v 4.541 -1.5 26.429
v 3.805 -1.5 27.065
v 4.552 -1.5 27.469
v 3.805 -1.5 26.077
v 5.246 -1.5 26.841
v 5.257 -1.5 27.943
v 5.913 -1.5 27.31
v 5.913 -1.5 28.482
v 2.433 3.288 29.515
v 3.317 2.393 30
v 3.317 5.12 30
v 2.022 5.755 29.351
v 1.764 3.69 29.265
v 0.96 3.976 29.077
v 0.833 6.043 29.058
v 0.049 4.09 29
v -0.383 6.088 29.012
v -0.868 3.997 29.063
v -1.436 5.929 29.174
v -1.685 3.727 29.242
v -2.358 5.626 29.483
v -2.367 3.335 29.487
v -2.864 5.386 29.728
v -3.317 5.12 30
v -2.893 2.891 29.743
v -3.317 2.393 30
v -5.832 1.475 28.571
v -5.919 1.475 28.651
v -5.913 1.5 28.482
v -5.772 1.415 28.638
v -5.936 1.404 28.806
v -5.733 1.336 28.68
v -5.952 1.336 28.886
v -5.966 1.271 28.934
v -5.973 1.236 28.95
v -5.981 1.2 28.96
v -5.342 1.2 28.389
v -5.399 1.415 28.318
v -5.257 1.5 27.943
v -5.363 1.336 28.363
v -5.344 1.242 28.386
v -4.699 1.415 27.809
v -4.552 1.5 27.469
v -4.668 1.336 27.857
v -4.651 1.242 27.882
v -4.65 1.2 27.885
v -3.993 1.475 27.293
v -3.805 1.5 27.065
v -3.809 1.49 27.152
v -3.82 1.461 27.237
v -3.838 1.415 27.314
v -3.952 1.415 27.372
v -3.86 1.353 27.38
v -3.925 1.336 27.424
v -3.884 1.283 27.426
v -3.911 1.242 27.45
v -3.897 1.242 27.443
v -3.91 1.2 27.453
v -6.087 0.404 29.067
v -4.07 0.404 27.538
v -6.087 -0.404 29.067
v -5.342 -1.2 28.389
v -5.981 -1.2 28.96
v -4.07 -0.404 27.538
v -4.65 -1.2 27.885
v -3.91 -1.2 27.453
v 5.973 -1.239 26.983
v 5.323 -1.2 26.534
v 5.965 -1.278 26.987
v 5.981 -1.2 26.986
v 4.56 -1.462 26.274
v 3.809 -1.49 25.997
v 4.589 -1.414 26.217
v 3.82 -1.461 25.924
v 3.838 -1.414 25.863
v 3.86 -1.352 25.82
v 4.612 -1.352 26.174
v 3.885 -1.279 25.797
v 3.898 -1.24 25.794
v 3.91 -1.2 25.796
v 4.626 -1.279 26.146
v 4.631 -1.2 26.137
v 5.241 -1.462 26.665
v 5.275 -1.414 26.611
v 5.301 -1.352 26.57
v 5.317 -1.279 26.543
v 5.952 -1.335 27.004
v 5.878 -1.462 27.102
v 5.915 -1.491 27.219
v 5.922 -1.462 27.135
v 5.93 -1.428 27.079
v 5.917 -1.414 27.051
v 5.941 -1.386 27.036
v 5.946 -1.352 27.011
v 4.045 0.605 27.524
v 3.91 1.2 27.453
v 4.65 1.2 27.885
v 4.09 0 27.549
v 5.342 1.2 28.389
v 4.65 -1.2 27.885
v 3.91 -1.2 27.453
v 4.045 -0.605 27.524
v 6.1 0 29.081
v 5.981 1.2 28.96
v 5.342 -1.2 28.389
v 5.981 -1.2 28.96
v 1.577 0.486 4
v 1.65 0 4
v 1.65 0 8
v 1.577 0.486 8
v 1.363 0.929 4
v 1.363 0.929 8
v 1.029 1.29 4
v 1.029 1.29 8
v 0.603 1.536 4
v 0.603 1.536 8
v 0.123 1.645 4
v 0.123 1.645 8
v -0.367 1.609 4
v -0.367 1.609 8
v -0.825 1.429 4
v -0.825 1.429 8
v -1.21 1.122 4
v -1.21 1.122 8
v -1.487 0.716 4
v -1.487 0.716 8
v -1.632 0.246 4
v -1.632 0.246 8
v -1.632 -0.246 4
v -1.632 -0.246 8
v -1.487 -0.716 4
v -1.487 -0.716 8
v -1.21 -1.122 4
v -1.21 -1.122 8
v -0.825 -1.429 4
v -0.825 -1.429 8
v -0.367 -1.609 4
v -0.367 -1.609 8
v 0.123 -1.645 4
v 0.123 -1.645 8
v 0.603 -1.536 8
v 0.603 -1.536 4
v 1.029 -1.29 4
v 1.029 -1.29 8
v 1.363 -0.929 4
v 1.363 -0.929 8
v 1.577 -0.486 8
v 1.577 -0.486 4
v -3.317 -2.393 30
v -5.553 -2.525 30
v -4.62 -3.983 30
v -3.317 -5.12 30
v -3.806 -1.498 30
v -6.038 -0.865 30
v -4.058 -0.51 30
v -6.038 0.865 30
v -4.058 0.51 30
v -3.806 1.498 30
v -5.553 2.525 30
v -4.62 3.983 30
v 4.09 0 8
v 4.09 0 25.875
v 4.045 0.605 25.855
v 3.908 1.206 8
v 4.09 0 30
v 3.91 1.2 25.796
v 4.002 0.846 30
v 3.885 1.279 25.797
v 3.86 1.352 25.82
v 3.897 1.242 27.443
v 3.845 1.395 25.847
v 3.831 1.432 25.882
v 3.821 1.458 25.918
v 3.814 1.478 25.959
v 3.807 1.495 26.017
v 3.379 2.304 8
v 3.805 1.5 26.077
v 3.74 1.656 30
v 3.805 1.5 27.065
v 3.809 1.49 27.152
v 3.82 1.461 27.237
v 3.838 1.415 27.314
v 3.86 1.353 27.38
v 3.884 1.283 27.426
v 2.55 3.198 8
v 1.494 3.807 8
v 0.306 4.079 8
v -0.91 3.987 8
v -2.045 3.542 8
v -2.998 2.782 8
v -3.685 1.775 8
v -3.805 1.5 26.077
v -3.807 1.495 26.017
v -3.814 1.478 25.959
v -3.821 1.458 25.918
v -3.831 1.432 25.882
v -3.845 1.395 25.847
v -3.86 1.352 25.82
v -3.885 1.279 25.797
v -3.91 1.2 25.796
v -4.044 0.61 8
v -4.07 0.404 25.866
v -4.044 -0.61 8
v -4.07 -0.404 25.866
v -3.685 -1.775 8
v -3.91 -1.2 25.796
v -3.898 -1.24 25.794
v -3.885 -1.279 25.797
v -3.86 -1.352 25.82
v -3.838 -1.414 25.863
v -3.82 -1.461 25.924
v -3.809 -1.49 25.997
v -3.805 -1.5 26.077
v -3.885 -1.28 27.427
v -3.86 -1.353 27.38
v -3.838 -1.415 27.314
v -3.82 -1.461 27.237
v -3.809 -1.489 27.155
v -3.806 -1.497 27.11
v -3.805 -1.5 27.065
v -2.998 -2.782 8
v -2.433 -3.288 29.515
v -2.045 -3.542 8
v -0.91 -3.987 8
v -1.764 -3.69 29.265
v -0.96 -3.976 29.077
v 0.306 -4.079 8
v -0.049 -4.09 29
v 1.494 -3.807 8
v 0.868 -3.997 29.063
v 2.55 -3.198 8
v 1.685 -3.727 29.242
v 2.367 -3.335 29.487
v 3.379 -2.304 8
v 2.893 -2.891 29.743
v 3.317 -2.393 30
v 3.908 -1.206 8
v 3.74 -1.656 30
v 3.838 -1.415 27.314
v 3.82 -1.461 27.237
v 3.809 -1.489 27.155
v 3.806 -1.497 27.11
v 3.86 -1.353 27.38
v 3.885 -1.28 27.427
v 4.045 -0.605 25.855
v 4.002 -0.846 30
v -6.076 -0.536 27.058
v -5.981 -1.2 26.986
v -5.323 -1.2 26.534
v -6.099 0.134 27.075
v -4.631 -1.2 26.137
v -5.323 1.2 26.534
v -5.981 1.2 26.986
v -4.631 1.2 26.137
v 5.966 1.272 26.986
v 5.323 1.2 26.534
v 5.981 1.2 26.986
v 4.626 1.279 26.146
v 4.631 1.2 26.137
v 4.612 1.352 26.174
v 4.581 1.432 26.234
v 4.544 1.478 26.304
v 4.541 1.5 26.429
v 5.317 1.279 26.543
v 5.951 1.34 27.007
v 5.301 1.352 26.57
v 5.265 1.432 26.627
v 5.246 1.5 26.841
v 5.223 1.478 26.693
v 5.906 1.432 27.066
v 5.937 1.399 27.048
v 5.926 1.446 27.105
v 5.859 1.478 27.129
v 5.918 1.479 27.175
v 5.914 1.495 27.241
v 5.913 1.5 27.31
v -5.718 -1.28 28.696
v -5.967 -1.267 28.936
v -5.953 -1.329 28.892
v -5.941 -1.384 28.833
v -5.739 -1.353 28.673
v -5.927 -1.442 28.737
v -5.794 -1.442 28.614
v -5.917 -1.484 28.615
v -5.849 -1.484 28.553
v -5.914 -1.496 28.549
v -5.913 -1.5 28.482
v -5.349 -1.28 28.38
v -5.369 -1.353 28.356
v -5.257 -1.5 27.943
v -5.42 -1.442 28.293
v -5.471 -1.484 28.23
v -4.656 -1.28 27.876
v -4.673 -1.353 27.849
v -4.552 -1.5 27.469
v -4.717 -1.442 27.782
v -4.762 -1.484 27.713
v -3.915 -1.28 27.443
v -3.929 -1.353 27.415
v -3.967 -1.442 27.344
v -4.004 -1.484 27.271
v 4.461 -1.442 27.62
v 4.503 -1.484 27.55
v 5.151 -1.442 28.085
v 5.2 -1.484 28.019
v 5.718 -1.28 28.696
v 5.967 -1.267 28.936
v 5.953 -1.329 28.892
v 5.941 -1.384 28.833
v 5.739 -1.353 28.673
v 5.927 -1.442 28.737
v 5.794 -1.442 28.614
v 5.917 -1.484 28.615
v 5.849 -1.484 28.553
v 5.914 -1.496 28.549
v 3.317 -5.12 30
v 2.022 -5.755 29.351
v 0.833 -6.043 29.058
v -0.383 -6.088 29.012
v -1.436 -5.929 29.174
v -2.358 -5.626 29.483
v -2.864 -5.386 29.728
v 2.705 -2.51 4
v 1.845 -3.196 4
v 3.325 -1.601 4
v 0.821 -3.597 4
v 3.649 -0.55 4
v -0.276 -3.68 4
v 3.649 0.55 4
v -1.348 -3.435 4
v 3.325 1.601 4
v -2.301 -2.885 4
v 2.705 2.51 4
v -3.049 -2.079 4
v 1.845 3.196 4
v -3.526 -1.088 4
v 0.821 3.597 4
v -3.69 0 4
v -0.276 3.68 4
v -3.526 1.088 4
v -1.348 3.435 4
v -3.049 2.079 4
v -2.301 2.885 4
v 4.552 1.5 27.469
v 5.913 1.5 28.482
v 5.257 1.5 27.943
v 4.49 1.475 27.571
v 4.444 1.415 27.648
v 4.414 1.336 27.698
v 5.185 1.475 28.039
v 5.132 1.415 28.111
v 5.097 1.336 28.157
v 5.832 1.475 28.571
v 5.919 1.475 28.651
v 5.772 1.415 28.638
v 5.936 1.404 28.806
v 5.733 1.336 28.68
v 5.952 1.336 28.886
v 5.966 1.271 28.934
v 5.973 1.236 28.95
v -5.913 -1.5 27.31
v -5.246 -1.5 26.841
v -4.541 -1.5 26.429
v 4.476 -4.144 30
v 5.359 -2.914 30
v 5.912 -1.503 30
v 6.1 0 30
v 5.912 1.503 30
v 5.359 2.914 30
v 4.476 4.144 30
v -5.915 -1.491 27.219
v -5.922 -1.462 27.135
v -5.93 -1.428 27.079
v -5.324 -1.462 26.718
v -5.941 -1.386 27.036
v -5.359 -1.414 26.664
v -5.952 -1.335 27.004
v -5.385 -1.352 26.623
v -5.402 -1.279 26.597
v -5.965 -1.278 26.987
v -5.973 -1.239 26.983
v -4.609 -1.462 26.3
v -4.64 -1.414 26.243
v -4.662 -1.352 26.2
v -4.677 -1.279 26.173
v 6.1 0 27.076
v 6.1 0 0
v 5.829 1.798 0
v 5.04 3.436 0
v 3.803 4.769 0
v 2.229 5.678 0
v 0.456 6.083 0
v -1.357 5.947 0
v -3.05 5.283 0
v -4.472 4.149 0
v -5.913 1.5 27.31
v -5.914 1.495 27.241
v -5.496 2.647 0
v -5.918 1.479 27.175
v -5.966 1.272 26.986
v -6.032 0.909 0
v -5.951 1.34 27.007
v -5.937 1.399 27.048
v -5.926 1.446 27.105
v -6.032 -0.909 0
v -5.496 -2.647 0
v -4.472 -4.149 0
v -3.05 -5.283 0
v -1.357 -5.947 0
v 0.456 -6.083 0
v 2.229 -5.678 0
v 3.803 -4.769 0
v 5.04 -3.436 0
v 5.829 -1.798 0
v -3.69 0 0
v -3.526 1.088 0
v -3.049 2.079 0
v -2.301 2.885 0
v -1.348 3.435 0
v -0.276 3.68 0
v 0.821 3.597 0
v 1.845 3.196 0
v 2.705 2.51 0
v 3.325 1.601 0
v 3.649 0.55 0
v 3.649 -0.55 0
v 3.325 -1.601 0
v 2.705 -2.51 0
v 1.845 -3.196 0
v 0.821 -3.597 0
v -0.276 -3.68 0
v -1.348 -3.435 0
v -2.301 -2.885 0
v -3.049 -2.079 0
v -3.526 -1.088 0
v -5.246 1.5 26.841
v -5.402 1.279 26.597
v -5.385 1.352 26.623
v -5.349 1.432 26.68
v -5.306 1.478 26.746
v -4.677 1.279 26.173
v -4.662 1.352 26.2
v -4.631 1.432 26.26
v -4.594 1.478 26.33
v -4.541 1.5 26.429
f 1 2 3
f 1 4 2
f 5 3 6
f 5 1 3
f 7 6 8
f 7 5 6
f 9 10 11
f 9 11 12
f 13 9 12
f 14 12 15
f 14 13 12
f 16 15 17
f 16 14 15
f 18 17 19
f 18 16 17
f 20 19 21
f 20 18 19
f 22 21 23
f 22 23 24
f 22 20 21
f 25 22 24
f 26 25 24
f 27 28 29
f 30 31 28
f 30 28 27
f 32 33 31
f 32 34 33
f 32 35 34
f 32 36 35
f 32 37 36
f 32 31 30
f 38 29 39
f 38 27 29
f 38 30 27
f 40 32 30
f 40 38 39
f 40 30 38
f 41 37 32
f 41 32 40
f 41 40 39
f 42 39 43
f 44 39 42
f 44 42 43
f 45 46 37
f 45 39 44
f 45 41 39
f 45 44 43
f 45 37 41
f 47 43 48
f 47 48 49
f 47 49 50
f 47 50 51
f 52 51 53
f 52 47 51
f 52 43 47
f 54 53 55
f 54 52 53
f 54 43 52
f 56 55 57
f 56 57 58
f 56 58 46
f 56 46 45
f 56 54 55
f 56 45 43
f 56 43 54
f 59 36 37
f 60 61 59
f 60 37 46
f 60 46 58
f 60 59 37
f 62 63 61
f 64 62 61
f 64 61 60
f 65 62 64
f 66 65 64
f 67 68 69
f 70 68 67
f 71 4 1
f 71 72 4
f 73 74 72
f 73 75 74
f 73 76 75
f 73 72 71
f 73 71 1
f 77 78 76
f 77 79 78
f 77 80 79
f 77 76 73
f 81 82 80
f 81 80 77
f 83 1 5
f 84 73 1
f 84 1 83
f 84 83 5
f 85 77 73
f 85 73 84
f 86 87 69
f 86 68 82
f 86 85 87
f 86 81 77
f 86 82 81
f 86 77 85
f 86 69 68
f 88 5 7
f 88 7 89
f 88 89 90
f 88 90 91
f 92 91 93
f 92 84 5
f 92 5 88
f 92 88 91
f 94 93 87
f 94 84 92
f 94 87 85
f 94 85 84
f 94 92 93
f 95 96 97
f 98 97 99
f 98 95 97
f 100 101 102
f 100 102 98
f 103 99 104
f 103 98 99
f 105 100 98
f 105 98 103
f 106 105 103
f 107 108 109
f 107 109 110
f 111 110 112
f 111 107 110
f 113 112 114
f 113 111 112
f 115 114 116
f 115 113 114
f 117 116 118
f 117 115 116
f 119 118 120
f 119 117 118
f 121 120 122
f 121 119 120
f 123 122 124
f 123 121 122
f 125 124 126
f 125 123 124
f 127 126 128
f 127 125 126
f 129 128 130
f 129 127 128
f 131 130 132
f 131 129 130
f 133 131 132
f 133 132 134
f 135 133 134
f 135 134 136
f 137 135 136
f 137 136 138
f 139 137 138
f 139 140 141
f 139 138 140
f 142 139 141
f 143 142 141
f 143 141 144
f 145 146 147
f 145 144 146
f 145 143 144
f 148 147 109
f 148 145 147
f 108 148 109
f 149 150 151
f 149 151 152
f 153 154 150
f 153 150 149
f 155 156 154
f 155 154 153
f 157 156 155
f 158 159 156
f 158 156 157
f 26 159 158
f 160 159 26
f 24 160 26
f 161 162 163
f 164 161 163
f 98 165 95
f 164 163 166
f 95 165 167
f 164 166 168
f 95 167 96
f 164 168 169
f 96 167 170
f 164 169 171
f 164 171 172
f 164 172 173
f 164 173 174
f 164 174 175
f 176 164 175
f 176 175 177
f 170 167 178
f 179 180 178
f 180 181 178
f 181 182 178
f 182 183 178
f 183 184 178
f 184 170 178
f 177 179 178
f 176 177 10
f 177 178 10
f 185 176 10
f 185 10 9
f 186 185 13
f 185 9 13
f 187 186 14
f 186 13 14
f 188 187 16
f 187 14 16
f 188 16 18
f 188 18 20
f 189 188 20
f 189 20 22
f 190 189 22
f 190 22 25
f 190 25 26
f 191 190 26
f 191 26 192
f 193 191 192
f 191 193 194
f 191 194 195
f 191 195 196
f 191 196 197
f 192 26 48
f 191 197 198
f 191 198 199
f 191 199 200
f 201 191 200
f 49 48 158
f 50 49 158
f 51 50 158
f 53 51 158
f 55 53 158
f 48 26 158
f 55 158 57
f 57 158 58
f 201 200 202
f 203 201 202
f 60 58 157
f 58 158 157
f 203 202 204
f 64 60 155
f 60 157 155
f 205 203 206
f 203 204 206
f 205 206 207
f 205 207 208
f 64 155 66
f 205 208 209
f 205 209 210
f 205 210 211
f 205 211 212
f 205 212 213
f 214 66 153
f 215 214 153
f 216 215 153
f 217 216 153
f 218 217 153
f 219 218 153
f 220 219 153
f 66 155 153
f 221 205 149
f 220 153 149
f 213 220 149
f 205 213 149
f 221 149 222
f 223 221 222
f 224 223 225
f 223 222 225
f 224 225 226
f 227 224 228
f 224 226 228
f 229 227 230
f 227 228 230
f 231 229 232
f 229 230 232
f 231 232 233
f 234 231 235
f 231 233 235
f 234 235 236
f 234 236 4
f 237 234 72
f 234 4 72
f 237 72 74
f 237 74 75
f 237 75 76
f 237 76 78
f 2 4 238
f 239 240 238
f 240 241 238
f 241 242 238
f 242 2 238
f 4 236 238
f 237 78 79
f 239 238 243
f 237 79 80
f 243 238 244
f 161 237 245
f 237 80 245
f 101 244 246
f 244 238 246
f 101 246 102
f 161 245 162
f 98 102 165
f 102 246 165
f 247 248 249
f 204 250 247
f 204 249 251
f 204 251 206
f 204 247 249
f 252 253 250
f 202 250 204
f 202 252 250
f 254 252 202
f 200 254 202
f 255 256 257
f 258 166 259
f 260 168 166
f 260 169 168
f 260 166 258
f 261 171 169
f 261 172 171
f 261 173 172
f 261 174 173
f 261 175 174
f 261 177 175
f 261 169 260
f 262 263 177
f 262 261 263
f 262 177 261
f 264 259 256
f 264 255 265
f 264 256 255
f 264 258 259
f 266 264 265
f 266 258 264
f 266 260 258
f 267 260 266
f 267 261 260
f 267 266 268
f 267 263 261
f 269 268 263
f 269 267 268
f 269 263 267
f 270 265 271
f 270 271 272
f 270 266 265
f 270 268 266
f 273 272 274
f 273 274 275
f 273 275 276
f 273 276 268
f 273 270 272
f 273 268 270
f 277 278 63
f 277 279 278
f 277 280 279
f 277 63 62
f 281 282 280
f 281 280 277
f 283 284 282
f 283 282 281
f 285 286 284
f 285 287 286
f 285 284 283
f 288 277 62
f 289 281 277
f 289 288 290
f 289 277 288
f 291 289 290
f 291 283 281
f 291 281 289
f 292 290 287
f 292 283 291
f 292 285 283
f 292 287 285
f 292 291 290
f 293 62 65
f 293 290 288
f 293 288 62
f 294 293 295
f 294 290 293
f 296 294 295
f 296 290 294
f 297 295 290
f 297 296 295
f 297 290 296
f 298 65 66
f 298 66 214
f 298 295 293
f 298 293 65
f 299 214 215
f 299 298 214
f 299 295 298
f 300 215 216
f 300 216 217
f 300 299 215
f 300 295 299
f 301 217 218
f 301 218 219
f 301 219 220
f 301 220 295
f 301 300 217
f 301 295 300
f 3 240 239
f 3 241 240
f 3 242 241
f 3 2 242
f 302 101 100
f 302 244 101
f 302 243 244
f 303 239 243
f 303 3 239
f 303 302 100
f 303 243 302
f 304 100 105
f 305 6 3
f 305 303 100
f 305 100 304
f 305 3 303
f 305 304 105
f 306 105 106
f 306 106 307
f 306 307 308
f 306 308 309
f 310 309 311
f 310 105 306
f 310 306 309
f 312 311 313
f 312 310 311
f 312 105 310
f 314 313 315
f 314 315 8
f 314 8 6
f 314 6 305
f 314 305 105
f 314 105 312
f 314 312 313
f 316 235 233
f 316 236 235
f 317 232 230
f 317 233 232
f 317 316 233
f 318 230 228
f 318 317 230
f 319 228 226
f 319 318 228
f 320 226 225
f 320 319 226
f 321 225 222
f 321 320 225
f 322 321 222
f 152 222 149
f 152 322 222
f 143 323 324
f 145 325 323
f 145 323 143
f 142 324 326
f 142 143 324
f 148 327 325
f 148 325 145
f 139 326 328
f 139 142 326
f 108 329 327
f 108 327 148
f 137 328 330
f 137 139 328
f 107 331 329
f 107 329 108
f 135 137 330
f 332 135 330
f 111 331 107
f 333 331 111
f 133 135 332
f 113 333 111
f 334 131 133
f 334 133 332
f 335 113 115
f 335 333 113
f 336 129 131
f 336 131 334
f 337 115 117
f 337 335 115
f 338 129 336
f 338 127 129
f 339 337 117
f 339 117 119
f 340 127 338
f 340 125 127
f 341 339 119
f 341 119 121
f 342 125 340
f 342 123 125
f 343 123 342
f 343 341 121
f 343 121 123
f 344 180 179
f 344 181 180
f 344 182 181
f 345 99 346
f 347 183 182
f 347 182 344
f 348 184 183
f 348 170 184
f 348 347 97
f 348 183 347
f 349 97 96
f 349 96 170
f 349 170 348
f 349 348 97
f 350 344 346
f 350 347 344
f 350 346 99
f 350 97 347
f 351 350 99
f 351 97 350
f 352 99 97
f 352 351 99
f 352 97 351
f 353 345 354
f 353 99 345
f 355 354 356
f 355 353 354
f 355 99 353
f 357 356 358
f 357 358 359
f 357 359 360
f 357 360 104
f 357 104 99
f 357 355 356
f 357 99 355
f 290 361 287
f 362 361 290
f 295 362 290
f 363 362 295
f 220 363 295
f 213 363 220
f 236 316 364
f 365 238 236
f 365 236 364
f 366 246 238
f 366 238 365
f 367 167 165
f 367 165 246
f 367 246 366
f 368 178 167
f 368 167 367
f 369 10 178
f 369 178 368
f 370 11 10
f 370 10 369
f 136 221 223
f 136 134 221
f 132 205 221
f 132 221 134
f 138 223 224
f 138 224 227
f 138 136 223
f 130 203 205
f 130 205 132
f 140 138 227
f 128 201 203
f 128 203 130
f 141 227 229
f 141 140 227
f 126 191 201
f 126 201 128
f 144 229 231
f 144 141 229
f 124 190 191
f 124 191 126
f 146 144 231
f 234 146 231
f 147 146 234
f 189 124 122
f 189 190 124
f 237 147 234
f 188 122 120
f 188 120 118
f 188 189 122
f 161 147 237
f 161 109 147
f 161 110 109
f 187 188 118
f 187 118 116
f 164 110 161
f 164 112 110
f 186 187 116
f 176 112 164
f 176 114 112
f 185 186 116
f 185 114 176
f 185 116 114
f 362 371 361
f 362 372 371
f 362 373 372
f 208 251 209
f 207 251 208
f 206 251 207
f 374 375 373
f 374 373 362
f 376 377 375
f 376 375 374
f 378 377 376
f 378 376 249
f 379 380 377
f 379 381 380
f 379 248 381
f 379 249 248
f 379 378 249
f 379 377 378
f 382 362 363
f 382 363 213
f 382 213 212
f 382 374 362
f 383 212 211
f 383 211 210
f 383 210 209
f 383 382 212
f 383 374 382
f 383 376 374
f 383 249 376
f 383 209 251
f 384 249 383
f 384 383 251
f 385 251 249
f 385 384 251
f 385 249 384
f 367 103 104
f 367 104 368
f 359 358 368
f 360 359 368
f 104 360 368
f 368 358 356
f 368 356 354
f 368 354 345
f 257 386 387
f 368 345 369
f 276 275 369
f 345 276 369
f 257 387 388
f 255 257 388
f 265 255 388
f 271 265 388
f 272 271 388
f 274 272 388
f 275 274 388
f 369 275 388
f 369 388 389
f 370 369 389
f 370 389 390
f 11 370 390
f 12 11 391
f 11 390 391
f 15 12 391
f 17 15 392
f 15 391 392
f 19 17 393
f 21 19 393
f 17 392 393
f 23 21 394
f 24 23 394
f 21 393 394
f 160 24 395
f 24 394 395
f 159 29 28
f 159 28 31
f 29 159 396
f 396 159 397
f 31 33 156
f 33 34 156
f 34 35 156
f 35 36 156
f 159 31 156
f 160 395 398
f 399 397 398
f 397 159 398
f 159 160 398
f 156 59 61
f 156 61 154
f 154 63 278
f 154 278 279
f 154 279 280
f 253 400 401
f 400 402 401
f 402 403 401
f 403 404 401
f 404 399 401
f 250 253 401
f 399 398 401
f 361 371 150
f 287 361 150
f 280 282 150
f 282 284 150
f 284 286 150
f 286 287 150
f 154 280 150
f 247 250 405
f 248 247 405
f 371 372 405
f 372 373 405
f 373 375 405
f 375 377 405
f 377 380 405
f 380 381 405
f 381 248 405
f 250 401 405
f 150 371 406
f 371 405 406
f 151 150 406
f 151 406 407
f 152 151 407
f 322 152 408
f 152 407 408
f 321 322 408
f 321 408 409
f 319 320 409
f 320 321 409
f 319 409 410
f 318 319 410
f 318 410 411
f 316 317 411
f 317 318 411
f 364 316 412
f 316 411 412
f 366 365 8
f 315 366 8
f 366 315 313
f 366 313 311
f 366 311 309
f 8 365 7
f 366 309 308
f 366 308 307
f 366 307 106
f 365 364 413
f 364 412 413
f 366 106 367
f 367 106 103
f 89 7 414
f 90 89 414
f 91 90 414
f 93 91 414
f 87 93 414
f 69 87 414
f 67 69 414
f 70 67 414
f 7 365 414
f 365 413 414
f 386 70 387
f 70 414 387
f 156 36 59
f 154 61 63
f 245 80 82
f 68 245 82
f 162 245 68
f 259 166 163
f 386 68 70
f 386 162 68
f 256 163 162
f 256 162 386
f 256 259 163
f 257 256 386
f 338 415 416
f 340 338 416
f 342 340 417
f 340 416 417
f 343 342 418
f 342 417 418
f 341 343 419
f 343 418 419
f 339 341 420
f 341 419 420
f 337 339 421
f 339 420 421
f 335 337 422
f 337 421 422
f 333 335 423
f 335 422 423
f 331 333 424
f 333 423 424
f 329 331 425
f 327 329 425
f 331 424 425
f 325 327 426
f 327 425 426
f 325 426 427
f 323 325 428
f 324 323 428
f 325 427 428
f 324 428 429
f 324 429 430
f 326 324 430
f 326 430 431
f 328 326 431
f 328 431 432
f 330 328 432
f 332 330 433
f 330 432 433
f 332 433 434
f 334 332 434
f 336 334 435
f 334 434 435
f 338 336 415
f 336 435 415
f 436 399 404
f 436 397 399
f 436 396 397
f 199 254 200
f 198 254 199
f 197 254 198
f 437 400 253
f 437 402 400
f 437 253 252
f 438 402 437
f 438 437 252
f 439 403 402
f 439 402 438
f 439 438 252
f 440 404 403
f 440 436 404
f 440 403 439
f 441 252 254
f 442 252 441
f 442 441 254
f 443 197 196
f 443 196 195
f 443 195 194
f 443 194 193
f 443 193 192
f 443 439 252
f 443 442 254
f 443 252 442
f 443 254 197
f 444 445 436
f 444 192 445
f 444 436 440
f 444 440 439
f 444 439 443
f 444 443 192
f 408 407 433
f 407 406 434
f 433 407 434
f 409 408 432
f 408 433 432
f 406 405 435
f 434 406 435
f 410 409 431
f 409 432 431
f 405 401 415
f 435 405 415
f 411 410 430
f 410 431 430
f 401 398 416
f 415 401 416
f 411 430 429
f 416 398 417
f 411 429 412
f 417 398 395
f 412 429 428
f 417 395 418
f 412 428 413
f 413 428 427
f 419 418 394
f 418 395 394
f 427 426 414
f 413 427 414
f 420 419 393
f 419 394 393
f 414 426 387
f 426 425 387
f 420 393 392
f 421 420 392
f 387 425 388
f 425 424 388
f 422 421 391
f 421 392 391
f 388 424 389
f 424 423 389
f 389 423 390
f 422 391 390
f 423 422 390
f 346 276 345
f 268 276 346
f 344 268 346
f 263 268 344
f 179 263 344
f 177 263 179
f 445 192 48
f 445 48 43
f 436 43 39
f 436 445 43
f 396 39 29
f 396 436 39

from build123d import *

# Parameters (mm, degrees)
SKETCH1_R               = 6.1
SKETCH1_R_2             = 1.65
BOSS_EXTRUDE1_DEPTH     = 30
SKETCH2_R               = 3.69
CUT_EXTRUDE1_DEPTH      = 4
SKETCH3_R               = 4.09
CUT_EXTRUDE3_DEPTH      = 22
CUT_EXTRUDE4_DEPTH      = 32.215701177
CUT_EXTRUDE4_DEPTH_BACK = 32.215701177
SKETCH4_R               = 6


with BuildPart() as part:
    # Sketch1 → Boss-Extrude1 (new body)
    with BuildSketch(Plane.XY):
        Circle(SKETCH1_R)
        Circle(SKETCH1_R_2, mode=Mode.SUBTRACT)
    extrude(amount=BOSS_EXTRUDE1_DEPTH)

    # Sketch2 → Cut-Extrude1 (cut)
    with BuildSketch(Plane(origin=(0, 0, 0), x_dir=(-1, 0, 0), z_dir=(0, 0, -1))):
        Circle(SKETCH2_R)
    extrude(amount=-CUT_EXTRUDE1_DEPTH, mode=Mode.SUBTRACT)

    # Sketch3 → Cut-Extrude3 (cut)
    with BuildSketch(Plane.XY.offset(30)):
        Circle(SKETCH3_R)
    extrude(amount=-CUT_EXTRUDE3_DEPTH, mode=Mode.SUBTRACT)

    # Sketch4 → Cut-Extrude4 (cut, two sides: drawn at the far end of the back side and taken through both)
    with BuildSketch(Plane(origin=(0, 0, 0), x_dir=(1, 0, 0), z_dir=(0, 1, 0)).offset(-CUT_EXTRUDE4_DEPTH_BACK)):
        with Locations((0, -35)):
            Circle(SKETCH4_R)
    extrude(amount=CUT_EXTRUDE4_DEPTH + CUT_EXTRUDE4_DEPTH_BACK, mode=Mode.SUBTRACT)

    # Sketch7 → Cut-Revolve1 (revolve, cut)
    with BuildSketch(Plane.XY.offset(35)):
        with BuildLine():
            Line((-9.7, 1.5), (-8.8, 1.5))
            ThreePointArc((-8.8, 1.5), (-8.587867966, 1.412132034), (-8.5, 1.2))
            Line((-8.5, 1.2), (-8.5, -1.2))
            ThreePointArc((-8.5, -1.2), (-8.587867966, -1.412132034), (-8.8, -1.5))
            Line((-8.8, -1.5), (-9.7, -1.5))
            ThreePointArc((-9.7, -1.5), (-9.912132034, -1.412132034), (-10, -1.2))
            Line((-10, -1.2), (-10, 1.2))
            ThreePointArc((-10, 1.2), (-9.912132034, 1.412132034), (-9.7, 1.5))
        make_face()
    revolve(axis=Axis((0, 6.1, 35), (0, -1, 0)), mode=Mode.SUBTRACT)


solid = part.part
